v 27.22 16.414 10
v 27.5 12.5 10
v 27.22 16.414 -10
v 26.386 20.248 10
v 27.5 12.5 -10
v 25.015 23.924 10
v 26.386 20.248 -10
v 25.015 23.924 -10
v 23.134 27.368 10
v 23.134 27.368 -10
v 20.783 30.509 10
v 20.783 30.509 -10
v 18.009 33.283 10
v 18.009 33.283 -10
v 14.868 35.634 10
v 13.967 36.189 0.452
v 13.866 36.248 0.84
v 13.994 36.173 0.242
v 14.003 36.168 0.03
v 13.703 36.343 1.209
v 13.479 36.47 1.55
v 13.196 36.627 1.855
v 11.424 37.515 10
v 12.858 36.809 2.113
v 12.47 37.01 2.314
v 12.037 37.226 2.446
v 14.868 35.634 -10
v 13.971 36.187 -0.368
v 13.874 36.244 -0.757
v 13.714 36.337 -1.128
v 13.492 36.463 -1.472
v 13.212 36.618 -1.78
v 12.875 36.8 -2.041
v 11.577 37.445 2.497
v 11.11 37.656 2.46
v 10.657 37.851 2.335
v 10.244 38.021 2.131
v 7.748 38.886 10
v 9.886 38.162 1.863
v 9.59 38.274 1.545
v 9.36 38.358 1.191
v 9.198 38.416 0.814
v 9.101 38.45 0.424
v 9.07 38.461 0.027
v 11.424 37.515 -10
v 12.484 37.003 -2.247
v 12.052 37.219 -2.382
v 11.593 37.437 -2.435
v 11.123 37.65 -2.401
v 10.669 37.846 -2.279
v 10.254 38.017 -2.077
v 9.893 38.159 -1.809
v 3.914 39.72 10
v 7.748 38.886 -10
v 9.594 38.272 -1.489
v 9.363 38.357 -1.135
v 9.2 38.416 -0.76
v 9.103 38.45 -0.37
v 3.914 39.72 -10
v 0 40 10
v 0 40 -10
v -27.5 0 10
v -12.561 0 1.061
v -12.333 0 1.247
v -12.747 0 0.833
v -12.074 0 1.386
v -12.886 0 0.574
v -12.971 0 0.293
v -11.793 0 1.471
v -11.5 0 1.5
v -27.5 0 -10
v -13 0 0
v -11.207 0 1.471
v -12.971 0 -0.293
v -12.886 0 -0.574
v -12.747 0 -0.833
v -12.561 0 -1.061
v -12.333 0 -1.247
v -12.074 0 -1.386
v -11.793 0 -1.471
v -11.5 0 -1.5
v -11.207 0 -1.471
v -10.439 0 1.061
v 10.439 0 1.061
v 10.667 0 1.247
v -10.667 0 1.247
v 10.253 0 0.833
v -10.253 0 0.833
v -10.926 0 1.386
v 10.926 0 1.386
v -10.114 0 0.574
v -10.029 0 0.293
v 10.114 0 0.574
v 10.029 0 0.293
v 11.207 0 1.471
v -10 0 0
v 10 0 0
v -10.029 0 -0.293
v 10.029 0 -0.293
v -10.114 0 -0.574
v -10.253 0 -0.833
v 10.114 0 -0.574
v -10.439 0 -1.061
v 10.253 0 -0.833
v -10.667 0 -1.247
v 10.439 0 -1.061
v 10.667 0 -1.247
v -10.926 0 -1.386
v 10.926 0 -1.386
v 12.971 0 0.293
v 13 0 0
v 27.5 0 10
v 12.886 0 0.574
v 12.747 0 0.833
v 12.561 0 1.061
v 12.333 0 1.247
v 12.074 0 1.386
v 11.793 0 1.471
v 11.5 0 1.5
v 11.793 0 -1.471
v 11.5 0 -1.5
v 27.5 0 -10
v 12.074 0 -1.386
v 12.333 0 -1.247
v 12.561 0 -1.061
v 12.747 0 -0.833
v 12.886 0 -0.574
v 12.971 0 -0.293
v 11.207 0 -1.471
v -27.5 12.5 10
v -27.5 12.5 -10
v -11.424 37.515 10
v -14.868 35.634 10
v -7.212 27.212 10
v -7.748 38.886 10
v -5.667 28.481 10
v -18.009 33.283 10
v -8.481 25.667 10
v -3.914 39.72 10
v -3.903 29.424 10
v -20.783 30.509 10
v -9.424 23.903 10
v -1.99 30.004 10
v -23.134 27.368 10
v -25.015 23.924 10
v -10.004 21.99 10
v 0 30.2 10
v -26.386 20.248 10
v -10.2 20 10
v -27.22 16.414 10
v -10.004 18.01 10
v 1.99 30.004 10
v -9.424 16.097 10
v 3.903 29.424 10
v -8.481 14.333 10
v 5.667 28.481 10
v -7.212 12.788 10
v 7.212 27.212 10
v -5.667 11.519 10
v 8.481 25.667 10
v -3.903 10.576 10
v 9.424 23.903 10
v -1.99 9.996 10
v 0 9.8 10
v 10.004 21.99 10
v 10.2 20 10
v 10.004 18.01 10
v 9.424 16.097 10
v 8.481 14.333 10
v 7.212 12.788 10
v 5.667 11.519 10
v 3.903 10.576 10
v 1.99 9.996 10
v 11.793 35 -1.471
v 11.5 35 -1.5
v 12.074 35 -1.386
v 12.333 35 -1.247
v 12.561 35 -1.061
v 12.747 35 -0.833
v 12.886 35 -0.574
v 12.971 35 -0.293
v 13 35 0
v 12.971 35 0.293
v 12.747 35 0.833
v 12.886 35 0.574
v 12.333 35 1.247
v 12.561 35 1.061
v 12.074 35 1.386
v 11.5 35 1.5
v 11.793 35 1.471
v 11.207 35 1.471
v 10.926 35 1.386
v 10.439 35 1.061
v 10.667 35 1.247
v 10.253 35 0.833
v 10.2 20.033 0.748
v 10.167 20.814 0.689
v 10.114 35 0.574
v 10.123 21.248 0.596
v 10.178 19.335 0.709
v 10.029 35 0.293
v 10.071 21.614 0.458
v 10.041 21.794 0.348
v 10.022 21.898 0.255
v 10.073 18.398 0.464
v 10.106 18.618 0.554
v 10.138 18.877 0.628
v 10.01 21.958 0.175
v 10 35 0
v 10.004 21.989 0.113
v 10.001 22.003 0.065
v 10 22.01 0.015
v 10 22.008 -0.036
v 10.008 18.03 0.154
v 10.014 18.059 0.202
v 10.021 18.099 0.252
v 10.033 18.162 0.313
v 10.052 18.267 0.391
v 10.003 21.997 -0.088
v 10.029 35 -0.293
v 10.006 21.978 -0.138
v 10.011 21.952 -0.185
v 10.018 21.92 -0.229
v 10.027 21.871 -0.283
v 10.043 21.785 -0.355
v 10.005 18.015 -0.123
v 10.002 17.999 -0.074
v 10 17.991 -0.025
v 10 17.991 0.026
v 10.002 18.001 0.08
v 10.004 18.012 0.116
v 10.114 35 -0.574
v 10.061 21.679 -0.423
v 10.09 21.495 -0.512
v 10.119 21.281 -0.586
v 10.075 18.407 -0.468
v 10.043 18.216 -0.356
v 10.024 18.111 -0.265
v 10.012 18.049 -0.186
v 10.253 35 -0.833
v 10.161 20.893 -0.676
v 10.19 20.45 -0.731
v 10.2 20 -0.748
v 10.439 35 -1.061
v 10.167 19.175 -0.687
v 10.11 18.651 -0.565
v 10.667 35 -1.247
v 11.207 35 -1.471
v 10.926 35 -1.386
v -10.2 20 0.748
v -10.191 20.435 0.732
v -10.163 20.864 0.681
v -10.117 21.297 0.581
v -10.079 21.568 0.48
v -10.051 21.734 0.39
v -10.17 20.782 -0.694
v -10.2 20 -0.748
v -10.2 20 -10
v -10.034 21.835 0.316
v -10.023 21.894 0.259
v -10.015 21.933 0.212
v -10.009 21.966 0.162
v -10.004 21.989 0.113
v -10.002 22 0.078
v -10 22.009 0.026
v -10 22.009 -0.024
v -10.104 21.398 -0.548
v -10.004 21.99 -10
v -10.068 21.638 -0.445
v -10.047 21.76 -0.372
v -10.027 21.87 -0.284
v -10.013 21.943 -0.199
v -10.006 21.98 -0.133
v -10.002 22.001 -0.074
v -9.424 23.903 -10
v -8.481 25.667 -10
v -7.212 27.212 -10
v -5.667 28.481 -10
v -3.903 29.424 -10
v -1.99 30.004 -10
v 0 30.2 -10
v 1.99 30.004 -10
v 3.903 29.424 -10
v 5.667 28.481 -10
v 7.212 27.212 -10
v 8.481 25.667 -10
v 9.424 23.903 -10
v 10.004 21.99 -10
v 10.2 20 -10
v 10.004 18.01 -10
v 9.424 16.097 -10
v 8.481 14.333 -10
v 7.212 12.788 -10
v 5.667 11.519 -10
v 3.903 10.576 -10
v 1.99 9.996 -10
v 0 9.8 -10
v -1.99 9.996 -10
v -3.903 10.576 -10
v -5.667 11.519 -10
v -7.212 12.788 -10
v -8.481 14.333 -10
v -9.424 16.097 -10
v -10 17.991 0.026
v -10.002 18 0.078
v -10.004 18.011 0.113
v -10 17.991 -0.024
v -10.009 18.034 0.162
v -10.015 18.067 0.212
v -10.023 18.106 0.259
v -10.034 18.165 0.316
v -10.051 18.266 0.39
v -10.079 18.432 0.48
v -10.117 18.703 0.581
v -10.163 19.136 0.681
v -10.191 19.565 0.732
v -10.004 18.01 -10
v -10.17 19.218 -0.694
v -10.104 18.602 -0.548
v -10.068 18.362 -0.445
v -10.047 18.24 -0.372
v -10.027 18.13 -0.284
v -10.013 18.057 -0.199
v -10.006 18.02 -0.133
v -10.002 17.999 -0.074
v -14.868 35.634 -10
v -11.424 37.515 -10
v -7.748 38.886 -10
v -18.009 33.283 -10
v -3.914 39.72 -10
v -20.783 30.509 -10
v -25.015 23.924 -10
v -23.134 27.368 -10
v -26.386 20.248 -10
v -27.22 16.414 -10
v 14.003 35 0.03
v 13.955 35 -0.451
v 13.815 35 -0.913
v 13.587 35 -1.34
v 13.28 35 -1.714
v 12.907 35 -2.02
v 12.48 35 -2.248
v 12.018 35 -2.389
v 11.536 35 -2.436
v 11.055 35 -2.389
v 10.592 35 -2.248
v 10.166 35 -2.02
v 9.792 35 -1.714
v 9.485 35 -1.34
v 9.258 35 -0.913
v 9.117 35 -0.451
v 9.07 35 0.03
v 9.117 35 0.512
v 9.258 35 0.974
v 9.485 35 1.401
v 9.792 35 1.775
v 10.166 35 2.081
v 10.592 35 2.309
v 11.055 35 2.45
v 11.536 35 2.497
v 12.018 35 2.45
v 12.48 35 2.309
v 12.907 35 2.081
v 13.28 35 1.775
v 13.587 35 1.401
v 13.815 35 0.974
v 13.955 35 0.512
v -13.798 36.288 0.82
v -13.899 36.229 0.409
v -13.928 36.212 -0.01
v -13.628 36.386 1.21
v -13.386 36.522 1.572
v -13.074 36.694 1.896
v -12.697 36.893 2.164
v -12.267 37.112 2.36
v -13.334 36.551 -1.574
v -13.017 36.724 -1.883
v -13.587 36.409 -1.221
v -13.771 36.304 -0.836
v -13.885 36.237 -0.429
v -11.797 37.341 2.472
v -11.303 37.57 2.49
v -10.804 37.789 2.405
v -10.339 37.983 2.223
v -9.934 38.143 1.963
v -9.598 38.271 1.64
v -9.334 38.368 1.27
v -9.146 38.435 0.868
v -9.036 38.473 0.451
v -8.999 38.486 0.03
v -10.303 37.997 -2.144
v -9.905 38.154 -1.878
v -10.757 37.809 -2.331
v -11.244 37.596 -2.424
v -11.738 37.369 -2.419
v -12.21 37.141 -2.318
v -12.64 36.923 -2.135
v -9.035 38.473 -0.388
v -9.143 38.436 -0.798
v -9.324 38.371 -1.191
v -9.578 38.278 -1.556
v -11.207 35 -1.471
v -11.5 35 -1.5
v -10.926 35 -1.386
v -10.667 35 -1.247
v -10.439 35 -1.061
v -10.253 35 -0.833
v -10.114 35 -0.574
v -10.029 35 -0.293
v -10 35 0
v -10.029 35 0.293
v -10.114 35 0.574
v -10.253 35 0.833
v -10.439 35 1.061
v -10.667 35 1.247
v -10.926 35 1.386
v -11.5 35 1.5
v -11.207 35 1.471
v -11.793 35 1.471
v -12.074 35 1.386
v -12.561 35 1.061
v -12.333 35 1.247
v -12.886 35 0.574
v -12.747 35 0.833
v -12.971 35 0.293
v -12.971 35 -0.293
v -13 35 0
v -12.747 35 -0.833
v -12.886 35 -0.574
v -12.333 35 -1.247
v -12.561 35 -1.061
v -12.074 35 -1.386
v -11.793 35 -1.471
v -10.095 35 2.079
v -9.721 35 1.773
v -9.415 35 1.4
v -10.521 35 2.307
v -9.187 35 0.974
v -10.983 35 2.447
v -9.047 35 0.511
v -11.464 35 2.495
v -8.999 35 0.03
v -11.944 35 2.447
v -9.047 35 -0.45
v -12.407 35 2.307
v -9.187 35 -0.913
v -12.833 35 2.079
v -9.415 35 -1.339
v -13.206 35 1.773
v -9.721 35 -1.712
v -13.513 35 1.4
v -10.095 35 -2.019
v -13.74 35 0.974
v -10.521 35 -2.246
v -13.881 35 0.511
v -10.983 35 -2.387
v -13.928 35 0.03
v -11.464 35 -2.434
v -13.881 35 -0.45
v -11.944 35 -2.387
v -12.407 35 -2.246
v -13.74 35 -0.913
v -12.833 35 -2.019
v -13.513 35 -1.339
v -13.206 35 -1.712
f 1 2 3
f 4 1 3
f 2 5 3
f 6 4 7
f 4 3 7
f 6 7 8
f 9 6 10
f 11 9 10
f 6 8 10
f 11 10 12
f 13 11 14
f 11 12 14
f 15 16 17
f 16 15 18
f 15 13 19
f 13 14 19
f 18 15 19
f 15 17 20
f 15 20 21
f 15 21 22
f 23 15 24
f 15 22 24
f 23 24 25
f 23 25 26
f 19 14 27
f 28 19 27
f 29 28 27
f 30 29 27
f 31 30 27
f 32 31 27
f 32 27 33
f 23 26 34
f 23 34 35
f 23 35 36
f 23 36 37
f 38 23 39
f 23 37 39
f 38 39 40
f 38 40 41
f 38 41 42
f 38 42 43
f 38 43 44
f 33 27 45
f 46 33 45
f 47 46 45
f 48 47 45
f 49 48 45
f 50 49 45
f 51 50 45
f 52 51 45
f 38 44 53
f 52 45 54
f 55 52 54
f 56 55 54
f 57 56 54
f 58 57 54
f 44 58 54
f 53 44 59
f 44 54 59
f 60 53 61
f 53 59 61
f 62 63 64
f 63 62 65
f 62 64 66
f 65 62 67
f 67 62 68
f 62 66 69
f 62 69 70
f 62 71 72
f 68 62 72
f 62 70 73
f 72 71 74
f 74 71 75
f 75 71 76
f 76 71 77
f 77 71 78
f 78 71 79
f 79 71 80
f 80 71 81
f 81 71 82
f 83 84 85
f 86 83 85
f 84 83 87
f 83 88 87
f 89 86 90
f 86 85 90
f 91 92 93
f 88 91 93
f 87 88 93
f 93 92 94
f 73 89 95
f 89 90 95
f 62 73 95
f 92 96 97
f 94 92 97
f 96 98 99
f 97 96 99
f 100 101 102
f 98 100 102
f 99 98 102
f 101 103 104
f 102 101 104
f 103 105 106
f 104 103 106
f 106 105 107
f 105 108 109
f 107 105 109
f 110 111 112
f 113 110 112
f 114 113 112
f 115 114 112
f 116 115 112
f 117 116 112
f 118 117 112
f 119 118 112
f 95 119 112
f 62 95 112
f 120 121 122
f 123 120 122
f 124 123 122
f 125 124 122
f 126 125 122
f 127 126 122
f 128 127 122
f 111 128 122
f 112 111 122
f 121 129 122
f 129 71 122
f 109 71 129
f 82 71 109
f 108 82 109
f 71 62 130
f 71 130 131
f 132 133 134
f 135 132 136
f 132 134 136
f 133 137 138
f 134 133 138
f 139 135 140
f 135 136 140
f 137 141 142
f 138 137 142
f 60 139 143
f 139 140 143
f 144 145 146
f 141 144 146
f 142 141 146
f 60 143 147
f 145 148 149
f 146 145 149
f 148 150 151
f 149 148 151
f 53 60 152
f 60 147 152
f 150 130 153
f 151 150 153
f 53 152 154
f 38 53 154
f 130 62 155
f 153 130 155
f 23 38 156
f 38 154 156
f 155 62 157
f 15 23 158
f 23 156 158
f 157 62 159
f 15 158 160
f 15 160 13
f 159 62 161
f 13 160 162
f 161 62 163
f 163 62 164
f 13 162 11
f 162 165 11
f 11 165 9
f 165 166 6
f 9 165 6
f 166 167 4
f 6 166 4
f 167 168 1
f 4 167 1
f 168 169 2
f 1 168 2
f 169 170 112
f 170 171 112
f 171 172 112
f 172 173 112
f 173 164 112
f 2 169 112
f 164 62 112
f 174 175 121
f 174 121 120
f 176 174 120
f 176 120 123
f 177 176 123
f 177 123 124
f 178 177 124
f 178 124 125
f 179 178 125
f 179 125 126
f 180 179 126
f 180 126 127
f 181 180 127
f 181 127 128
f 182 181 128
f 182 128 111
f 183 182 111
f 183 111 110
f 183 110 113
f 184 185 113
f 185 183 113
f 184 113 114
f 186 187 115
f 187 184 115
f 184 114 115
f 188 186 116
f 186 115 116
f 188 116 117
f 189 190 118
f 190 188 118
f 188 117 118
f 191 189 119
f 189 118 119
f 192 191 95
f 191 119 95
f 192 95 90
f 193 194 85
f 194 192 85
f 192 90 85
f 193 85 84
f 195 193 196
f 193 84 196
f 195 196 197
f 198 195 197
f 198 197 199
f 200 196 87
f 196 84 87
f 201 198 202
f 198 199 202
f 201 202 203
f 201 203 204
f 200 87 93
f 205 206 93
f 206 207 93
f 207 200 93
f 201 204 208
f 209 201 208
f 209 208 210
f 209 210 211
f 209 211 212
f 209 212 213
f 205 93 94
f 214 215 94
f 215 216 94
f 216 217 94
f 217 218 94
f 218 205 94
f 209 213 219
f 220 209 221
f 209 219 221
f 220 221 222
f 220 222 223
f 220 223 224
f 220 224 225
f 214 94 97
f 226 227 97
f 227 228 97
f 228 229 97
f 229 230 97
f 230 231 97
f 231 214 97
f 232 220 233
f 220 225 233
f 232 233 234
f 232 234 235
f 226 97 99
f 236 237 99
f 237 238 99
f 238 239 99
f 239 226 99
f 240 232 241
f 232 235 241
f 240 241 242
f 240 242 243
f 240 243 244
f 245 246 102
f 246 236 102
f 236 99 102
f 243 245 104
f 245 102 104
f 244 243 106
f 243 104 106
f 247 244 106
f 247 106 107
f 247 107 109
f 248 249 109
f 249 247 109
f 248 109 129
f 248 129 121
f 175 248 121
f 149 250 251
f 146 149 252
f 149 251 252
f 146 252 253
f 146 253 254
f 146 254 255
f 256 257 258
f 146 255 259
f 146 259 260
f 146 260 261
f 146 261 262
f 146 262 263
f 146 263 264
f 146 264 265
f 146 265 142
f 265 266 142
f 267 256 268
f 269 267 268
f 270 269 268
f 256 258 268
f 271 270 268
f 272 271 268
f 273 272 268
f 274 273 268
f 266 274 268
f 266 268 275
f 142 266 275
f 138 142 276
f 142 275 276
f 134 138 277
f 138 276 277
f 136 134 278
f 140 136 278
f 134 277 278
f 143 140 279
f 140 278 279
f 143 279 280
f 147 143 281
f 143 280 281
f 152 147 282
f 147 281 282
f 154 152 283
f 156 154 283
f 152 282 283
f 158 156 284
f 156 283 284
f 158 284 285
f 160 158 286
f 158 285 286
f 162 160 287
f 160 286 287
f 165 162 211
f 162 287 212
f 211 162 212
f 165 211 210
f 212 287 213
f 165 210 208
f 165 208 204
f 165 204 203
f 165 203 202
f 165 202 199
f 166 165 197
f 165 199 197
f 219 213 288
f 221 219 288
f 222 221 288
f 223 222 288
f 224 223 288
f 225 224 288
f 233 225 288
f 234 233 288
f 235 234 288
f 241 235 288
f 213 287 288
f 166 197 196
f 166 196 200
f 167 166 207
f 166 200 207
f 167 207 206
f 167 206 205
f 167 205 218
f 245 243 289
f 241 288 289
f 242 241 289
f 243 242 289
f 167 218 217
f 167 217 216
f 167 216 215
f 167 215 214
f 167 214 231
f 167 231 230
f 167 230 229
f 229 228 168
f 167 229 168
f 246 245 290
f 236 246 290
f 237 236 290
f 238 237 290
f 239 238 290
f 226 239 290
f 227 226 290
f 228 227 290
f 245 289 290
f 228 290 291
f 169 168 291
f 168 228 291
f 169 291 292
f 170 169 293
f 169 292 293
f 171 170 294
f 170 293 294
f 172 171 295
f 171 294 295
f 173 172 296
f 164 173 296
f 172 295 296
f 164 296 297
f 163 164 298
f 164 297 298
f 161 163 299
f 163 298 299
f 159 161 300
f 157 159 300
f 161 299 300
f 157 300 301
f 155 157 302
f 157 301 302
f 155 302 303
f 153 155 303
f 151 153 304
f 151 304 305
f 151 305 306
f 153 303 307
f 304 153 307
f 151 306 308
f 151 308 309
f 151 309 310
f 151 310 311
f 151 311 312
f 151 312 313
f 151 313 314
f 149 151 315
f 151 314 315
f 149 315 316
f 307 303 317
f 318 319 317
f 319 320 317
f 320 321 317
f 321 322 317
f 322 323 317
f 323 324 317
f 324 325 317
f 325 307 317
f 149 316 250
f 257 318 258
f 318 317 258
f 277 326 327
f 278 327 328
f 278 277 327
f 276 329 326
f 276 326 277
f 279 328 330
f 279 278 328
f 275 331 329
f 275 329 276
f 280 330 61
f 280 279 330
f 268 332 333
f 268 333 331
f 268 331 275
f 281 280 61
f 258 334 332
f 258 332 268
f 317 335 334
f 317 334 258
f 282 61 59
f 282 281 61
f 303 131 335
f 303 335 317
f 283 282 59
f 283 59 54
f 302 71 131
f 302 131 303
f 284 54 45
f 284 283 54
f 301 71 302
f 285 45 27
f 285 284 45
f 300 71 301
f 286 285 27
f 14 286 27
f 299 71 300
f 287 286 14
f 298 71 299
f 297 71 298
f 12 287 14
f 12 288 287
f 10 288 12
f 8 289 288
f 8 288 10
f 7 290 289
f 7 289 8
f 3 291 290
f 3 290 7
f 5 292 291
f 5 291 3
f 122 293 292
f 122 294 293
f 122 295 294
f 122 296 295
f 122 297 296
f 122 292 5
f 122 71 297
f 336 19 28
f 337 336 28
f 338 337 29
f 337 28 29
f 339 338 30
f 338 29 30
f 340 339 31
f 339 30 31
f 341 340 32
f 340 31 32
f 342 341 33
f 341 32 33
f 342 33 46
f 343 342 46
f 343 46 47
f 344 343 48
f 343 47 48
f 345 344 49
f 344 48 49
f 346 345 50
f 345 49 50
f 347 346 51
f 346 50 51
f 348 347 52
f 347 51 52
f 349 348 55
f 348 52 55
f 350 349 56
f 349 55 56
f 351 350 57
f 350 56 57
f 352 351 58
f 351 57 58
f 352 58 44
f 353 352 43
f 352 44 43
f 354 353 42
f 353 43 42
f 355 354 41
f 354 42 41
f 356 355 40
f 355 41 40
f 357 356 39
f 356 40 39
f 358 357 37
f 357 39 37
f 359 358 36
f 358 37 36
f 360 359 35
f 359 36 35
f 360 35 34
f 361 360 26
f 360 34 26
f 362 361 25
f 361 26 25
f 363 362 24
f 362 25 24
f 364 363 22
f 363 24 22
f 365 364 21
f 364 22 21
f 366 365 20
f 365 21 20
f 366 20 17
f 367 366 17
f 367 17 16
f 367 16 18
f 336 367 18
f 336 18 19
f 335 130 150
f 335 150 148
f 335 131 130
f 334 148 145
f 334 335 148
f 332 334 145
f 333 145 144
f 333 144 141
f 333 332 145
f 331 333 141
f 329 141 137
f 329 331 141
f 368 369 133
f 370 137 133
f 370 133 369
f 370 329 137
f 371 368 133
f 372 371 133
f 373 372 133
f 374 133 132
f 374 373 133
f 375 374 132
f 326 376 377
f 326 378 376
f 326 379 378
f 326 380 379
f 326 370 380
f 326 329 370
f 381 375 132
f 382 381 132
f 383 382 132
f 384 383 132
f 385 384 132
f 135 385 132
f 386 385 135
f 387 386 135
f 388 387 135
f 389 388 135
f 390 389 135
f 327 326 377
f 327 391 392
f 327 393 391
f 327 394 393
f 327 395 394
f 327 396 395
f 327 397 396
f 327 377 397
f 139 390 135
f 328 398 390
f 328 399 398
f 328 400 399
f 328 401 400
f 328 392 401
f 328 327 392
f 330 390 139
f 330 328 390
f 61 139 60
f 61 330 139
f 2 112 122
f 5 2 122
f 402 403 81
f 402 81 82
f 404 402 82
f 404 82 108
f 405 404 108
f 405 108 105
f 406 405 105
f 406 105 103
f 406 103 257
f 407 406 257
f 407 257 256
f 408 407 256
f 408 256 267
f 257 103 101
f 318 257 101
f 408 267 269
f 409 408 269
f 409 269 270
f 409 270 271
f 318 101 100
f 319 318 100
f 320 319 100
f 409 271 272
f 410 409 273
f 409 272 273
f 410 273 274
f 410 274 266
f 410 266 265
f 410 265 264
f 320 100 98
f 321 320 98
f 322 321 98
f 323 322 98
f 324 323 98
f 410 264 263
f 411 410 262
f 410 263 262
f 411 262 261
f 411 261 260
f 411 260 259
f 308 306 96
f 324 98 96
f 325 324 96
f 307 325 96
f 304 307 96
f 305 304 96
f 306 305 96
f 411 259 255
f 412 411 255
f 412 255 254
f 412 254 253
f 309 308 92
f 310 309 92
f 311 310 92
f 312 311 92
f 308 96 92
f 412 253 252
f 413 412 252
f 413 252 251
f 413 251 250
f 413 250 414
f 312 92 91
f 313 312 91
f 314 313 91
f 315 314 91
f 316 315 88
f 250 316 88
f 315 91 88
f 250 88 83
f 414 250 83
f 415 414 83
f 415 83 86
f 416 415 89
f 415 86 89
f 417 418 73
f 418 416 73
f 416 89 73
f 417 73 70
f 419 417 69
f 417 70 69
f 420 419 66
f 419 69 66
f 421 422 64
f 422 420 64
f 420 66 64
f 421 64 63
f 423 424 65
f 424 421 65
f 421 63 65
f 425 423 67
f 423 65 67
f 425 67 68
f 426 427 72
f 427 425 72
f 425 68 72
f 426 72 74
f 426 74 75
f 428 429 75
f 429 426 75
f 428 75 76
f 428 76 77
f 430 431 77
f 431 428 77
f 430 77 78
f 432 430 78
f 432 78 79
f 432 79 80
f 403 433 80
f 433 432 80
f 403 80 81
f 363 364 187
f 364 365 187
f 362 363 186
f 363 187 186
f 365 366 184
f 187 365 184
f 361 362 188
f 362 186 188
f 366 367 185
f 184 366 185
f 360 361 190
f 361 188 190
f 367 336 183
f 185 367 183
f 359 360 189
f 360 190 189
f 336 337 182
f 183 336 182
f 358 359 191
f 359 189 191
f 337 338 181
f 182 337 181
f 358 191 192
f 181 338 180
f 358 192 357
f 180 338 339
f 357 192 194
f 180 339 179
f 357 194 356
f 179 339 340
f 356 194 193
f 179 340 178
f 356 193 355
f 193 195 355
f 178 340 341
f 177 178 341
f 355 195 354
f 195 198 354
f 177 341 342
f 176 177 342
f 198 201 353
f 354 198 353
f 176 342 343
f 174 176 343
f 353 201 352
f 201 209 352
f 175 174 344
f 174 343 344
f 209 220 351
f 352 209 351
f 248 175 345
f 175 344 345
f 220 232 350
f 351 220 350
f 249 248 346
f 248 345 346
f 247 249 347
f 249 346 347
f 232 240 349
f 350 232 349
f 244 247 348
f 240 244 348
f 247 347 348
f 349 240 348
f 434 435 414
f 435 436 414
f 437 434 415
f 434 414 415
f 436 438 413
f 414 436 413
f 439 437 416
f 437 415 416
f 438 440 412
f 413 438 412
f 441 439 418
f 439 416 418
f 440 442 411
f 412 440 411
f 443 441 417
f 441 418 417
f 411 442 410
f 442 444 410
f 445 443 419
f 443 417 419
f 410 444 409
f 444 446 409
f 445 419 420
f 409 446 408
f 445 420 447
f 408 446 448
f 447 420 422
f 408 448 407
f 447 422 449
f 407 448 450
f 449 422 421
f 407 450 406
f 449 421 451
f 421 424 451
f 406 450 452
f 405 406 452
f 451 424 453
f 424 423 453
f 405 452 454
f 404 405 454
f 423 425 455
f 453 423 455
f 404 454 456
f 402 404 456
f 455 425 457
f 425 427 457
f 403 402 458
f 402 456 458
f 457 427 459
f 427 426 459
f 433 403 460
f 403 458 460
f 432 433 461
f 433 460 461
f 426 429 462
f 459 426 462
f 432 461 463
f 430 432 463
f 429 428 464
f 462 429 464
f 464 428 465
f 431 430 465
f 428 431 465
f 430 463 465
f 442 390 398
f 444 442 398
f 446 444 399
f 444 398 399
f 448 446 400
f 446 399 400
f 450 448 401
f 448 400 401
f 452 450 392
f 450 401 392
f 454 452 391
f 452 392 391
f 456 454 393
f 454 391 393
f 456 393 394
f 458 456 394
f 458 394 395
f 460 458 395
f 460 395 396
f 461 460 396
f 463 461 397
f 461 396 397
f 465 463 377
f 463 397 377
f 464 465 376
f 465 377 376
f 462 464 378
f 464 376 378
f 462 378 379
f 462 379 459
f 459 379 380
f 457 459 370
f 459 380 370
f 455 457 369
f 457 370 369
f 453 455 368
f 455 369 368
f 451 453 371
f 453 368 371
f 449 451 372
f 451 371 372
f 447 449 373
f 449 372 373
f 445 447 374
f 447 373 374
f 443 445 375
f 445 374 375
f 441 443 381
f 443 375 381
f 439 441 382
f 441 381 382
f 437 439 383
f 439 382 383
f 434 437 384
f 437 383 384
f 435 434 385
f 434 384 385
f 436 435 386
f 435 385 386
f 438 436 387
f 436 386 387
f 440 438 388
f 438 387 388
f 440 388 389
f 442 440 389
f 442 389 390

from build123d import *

# Parameters (mm, degrees)
SKETCH1_W              = 55
SKETCH1_H              = 20
BOSS_EXTRUDE2_DEPTH    = 40
FILLET3_R              = 27.5
SKETCH3_R              = 10.2
CUT_EXTRUDE1_DEPTH     = 40
SKETCH4_R              = 1.5
CUT_EXTRUDE2_DEPTH     = 40
CUT_EXTRUDE3_OUTLINE_W = 1.013964341
CUT_EXTRUDE3_OUTLINE_H = 3.461369181
CUT_EXTRUDE4_OUTLINE_W = 1.011767624
CUT_EXTRUDE4_OUTLINE_H = 3.485879142


# Read off the part's stored shape, not the designer's step: Cut-Extrude3, Cut-Extrude4
with BuildPart() as part:
    # Sketch1 → Boss-Extrude2 (new body)
    with BuildSketch(Plane(origin=(0, 0, 0), x_dir=(1, 0, 0), z_dir=(0, 1, 0))):
        Rectangle(SKETCH1_W, SKETCH1_H)
    extrude(amount=BOSS_EXTRUDE2_DEPTH)

    # Fillet3
    fillet3_edges = [part.edges().sort_by_distance(p)[0] for p in [
        (27.5, 40, 0),
        (-27.5, 40, 0),
    ]]
    fillet(fillet3_edges, radius=FILLET3_R - 0.0001)  # a hair under: the kernel refuses the full size

    # Sketch3 → Cut-Extrude1 (cut)
    with BuildSketch(Plane(origin=(0, 0, -10), x_dir=(-1, 0, 0), z_dir=(0, 0, -1))):
        with Locations((0, 20)):
            Circle(SKETCH3_R)
    extrude(amount=-CUT_EXTRUDE1_DEPTH, mode=Mode.SUBTRACT)

    # Sketch4 → Cut-Extrude2 (cut)
    with BuildSketch(Plane.XZ):
        with Locations(Location((-11.5, 0, 0), (0, 0, 270))):
            Circle(SKETCH4_R)
        with Locations(Location((11.5, 0, 0), (0, 0, 270))):
            Circle(SKETCH4_R)
    extrude(amount=-CUT_EXTRUDE2_DEPTH, mode=Mode.SUBTRACT)

    # Cut-Extrude3 outline → Cut-Extrude3 (revolve, cut)
    with BuildSketch(Plane(origin=(11.536337156, 0, 0.030463059), x_dir=(1, 0, 0), z_dir=(0, 0, 1))):
        with Locations((1.959565013, 36.730684591)):
            Rectangle(CUT_EXTRUDE3_OUTLINE_W, CUT_EXTRUDE3_OUTLINE_H)
    revolve(axis=Axis((11.536337156, 0, 0.030463059), (0, 1, 0)), mode=Mode.SUBTRACT)

    # Cut-Extrude4 outline → Cut-Extrude4 (revolve, cut)
    with BuildSketch(Plane(origin=(-11.463662844, 0, 0.030463059), x_dir=(1, 0, 0), z_dir=(0, 0, 1))):
        with Locations((1.958466654, 36.742939571)):
            Rectangle(CUT_EXTRUDE4_OUTLINE_W, CUT_EXTRUDE4_OUTLINE_H)
    revolve(axis=Axis((-11.463662844, 0, 0.030463059), (0, 1, 0)), mode=Mode.SUBTRACT)


solid = part.part
